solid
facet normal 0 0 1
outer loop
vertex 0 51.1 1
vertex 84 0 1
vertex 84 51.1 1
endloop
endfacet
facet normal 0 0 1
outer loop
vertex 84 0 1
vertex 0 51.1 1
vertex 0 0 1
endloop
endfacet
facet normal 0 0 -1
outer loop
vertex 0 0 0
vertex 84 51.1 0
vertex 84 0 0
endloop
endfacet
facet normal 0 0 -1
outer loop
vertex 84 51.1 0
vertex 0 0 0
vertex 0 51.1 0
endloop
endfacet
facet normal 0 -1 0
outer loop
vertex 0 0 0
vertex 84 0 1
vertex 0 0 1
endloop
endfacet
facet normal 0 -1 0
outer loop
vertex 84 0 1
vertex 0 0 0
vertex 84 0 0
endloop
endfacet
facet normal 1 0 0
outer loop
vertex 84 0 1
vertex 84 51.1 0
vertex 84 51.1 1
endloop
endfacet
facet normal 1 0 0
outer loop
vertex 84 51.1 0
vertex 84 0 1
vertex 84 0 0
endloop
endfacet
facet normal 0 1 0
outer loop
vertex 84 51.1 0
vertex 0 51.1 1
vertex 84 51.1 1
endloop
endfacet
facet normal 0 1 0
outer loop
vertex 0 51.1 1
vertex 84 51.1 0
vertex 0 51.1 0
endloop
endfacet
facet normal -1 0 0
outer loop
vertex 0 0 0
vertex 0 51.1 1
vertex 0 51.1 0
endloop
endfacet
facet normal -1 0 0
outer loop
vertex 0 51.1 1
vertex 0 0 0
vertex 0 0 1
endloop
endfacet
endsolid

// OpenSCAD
color("black") cube([80+4,47.1+4,1]);
translate([2,2,1]) {
  color("green") linear_extrude(height=2) import("hslogo-base.dxf");
  color("yellow") translate([0,0,2]) linear_extrude(height=1) import("hslogo-detail.dxf");
}
